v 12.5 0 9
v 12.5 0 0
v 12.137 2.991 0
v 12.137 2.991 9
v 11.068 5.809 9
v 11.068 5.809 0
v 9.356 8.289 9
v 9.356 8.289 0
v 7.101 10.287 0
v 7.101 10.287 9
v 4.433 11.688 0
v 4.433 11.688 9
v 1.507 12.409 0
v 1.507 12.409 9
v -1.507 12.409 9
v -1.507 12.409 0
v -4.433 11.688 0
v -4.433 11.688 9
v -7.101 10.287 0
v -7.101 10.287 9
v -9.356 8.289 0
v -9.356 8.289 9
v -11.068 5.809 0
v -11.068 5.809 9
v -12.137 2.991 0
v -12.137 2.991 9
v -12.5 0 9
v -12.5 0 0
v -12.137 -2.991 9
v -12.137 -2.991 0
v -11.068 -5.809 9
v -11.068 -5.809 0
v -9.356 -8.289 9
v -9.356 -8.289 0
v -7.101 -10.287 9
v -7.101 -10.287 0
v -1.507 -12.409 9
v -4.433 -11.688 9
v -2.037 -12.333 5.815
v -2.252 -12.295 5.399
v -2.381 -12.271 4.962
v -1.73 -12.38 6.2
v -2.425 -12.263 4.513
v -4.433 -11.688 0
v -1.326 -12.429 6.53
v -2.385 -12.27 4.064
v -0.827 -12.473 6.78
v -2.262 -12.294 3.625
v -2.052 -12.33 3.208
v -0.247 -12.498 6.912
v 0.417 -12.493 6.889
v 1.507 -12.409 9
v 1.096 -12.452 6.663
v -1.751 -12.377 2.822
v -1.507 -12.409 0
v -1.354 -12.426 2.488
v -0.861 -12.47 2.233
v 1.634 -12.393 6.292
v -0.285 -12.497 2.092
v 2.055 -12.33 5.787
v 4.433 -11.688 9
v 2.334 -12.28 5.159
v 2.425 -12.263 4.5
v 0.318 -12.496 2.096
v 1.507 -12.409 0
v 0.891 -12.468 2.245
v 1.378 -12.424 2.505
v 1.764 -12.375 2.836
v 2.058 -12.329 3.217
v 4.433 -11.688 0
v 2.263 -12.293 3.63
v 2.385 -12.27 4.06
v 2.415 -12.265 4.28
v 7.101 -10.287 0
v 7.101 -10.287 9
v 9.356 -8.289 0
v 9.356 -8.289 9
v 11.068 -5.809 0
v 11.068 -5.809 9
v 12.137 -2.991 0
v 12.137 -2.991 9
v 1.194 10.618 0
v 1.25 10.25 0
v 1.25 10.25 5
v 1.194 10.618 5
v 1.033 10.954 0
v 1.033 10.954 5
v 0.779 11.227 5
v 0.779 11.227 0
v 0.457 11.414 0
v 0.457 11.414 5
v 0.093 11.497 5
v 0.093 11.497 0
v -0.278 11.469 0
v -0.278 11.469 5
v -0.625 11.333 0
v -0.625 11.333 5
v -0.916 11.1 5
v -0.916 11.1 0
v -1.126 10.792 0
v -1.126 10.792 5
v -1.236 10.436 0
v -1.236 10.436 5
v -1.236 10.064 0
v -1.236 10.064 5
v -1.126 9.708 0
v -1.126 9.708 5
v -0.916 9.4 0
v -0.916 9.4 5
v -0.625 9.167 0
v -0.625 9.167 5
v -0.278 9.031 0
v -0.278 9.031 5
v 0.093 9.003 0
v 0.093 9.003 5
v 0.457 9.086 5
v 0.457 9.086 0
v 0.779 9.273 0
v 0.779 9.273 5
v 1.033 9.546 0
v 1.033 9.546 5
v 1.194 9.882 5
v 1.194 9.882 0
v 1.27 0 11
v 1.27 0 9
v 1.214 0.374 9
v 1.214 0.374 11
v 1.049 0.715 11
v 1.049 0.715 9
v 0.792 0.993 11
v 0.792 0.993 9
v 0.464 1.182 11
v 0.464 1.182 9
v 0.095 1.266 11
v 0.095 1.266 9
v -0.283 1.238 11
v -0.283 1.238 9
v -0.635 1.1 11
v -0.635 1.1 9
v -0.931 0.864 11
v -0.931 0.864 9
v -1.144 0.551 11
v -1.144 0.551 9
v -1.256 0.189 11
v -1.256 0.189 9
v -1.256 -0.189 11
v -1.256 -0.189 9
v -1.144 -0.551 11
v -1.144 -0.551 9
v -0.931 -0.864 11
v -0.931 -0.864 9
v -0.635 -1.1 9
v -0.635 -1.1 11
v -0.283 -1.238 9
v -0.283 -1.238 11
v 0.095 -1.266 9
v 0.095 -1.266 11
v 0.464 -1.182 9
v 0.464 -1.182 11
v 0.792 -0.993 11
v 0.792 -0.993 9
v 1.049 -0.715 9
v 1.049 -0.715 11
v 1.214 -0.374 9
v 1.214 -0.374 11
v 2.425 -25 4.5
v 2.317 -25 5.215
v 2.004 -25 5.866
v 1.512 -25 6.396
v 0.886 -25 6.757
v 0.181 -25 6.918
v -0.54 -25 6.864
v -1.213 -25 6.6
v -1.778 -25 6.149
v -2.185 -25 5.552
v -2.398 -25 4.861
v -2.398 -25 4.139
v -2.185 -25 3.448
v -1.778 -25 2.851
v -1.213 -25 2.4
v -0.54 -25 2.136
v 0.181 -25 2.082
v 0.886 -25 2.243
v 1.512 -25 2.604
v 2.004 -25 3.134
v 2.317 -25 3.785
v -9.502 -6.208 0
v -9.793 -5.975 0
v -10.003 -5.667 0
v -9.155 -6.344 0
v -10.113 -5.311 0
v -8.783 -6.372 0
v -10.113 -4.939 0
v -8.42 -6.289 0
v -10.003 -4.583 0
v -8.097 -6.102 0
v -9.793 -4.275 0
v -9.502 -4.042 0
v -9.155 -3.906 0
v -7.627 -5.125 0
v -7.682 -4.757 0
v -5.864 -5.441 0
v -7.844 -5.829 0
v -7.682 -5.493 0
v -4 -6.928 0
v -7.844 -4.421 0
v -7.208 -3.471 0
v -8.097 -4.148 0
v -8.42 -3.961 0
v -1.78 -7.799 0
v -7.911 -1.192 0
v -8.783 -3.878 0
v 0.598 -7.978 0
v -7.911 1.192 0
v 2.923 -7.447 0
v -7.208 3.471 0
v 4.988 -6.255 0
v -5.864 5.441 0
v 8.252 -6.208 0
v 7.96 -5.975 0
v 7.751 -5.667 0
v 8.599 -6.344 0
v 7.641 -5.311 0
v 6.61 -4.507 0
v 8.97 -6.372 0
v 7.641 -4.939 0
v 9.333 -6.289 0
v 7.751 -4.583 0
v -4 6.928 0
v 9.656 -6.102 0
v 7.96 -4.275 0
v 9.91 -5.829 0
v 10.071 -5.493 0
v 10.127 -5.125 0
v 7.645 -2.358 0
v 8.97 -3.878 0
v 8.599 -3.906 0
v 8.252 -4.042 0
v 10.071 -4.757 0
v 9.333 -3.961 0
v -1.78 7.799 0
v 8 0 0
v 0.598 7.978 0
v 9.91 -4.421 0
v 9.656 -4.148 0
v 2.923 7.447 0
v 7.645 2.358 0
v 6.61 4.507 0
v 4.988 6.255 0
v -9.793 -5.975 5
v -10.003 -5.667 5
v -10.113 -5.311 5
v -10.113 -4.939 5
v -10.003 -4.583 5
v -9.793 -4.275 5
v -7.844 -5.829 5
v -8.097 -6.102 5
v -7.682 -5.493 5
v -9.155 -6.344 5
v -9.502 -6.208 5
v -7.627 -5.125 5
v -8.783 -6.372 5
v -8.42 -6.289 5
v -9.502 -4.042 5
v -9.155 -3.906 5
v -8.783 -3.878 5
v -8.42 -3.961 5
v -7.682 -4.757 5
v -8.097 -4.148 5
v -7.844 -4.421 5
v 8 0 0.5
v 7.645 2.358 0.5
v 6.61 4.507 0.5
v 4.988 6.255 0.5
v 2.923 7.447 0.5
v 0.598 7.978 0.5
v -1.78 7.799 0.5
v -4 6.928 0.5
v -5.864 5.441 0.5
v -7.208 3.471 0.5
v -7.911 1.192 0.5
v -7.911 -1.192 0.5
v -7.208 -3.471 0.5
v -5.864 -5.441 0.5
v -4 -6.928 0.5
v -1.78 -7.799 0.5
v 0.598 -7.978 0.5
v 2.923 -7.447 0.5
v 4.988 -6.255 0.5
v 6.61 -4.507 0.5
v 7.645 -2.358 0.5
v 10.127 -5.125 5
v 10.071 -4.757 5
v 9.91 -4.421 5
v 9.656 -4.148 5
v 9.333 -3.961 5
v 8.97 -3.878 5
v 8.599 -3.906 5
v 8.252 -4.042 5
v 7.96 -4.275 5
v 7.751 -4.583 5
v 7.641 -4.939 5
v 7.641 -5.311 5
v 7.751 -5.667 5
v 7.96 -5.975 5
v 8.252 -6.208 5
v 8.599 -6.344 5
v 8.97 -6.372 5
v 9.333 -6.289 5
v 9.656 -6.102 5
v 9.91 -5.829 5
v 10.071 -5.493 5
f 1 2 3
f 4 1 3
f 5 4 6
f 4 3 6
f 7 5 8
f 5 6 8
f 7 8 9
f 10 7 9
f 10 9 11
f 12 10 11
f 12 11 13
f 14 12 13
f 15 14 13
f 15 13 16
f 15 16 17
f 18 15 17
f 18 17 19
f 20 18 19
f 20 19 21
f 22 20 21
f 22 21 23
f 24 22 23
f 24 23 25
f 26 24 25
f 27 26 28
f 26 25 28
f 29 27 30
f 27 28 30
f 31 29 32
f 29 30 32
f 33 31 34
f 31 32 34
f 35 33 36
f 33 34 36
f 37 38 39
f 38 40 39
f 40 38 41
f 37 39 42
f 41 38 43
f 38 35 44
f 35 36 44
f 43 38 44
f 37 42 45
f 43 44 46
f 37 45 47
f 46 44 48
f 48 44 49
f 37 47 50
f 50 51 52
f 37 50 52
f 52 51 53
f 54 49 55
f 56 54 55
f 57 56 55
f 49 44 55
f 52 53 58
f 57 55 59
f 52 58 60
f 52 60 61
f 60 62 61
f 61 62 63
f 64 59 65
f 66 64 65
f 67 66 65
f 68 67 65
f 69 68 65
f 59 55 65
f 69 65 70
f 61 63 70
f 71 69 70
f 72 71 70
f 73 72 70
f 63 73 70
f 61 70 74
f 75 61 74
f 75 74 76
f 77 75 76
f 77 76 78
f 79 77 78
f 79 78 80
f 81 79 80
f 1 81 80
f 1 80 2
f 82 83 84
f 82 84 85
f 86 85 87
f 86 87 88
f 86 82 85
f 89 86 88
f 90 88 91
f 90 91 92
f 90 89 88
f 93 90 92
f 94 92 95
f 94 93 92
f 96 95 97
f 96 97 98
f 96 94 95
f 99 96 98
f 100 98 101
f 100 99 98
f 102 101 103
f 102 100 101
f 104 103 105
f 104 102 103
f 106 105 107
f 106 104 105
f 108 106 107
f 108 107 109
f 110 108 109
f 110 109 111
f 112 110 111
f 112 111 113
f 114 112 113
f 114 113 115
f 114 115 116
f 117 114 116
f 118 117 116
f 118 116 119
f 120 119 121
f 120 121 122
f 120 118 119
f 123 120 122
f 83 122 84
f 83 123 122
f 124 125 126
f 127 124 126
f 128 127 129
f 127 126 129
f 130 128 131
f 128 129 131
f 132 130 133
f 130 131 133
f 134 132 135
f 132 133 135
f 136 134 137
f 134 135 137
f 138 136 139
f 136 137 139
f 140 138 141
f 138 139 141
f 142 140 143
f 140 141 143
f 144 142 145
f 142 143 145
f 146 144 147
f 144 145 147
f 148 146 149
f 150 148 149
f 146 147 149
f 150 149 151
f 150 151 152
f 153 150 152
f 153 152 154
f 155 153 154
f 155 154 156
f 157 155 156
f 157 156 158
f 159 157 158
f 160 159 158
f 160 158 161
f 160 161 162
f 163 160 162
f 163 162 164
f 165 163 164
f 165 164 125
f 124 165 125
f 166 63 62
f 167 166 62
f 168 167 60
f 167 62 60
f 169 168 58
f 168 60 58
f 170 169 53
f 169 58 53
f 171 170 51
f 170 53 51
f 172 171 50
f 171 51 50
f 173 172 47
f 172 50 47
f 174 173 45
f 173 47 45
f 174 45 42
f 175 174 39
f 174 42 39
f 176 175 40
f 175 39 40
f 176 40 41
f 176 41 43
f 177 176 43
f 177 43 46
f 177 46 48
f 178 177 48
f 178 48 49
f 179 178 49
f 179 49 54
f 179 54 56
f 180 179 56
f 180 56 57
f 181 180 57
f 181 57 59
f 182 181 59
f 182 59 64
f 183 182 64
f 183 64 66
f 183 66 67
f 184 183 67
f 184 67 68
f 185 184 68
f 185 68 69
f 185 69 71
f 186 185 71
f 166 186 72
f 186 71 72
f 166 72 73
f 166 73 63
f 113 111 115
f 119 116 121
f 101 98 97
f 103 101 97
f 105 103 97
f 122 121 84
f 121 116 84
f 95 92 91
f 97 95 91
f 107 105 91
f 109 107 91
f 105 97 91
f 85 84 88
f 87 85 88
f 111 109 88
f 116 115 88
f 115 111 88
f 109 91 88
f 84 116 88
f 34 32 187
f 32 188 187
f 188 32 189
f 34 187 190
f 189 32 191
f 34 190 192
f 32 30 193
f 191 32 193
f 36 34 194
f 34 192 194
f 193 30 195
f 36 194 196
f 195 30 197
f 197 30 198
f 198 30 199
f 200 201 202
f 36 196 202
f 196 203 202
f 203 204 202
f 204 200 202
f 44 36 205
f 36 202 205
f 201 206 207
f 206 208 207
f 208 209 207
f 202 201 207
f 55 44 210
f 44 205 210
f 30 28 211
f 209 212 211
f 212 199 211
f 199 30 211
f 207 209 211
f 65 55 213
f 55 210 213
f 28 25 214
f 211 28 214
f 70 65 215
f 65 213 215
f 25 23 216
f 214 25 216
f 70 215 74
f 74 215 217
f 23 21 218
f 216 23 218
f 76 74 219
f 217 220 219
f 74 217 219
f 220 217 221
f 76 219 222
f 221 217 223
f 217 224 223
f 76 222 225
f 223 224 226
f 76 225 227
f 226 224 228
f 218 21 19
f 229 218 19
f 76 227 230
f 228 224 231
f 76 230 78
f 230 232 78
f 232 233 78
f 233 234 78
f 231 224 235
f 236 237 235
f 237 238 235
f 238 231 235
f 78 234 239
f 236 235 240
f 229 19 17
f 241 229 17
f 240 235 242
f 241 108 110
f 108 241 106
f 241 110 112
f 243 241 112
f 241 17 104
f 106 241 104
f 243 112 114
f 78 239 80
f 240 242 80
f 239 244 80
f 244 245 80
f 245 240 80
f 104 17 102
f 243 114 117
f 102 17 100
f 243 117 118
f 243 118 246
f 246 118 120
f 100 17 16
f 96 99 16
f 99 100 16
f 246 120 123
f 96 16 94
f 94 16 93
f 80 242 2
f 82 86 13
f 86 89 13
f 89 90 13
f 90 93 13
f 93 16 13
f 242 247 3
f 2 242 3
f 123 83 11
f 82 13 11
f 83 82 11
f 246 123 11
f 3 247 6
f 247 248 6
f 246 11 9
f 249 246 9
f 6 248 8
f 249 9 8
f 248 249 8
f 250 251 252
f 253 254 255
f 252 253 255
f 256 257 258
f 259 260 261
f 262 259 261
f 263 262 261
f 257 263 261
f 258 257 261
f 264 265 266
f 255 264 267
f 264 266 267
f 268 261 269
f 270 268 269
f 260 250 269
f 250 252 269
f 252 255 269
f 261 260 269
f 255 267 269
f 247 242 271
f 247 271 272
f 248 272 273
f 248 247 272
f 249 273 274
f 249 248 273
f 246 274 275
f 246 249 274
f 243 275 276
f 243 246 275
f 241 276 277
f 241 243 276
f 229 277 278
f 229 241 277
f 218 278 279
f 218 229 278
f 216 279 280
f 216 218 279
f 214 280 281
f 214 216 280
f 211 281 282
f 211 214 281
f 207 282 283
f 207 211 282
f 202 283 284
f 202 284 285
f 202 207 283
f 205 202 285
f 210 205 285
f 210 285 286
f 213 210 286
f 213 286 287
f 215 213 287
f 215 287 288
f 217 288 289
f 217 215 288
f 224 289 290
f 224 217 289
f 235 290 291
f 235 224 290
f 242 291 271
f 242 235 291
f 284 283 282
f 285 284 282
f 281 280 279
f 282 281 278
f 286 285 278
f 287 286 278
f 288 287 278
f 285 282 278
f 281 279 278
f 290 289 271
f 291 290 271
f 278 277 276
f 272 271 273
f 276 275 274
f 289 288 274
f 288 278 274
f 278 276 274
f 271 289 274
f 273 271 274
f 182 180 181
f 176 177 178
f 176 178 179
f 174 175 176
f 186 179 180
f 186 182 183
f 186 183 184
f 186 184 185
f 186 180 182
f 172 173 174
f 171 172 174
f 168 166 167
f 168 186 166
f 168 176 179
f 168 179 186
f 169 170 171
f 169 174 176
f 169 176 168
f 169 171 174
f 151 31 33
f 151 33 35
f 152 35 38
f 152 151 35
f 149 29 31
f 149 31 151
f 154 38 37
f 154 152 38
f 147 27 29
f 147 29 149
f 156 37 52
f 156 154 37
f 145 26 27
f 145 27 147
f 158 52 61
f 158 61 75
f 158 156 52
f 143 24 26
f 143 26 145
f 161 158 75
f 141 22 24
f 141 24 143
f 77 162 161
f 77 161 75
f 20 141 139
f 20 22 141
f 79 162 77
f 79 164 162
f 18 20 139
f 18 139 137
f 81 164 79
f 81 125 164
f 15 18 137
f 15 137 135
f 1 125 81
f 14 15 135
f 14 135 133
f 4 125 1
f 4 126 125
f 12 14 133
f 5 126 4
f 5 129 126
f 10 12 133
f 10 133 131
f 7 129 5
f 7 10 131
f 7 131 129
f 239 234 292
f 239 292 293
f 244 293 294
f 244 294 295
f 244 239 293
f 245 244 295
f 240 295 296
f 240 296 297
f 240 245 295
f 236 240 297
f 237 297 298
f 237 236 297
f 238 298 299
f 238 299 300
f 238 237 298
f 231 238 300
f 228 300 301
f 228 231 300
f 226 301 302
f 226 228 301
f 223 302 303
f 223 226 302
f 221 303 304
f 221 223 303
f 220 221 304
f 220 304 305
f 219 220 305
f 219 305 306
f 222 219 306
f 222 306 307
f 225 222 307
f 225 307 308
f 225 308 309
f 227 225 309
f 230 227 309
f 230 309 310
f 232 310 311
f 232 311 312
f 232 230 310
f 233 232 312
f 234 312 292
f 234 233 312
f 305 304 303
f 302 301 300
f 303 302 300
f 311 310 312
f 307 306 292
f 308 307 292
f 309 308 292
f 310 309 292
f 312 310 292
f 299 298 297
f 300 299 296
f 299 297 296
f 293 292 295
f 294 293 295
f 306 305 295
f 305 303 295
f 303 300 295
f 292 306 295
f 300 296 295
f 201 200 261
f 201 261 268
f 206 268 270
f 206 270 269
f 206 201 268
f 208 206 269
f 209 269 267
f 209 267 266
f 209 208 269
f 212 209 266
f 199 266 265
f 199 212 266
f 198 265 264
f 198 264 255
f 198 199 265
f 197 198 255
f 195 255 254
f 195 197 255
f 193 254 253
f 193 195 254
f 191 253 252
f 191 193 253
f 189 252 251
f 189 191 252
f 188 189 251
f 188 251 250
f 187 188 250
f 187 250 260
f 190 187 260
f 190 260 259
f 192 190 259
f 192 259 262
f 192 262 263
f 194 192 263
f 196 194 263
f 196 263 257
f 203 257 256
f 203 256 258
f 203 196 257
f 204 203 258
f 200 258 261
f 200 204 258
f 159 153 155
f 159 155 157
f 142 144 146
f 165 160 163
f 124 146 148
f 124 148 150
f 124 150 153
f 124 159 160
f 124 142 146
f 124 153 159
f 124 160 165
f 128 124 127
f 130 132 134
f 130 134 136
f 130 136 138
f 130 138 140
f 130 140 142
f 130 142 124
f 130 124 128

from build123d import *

# Parameters (mm, degrees)
F0_R     = 12.5
F0_R_2   = 1.25
F0_R_3   = 8
F0_R_4   = 1.27
F1_DEPTH = 9
F2_DEPTH = 11
F3_DEPTH = 0.5
F4_DEPTH = 5
F5_R     = 2.425
F6_DEPTH = 25


with BuildPart() as f1:
    # F0 (on Top) → F1 (new body)
    with BuildSketch(Plane.XY):
        Circle(F0_R)
        with Locations((-8.87676, -5.125)):
            Circle(F0_R_2, mode=Mode.SUBTRACT)
        with Locations((8.87676, -5.125)):
            Circle(F0_R_2, mode=Mode.SUBTRACT)
        Circle(F0_R_3, mode=Mode.SUBTRACT)
        with Locations((0, 10.25)):
            Circle(F0_R_2, mode=Mode.SUBTRACT)
        Circle(F0_R_3)
        Circle(F0_R_4, mode=Mode.SUBTRACT)
        with Locations((-8.87676, -5.125)):
            Circle(F0_R_2)
        with Locations((8.87676, -5.125)):
            Circle(F0_R_2)
        Circle(F0_R_4)
        with Locations((0, 10.25)):
            Circle(F0_R_2)
    extrude(amount=F1_DEPTH)

    # F0 (on Top) → F2 (join)
    with BuildSketch(Plane.XY):
        Circle(F0_R_4)
    extrude(amount=F2_DEPTH)

    # F0 (on Top) → F3 (cut)
    with BuildSketch(Plane.XY):
        Circle(F0_R_3)
        Circle(F0_R_4, mode=Mode.SUBTRACT)
        Circle(F0_R_4)
    extrude(amount=F3_DEPTH, mode=Mode.SUBTRACT)

    # F0 (on Top) → F4 (cut)
    with BuildSketch(Plane.XY):
        with Locations((-8.87676, -5.125)):
            Circle(F0_R_2)
        with Locations((8.87676, -5.125)):
            Circle(F0_R_2)
        with Locations((0, 10.25)):
            Circle(F0_R_2)
    extrude(amount=F4_DEPTH, mode=Mode.SUBTRACT)

    # F5 (on Front) → F6 (join)
    with BuildSketch(Plane.XZ):
        with Locations((0, 4.5)):
            Circle(F5_R)
    extrude(amount=F6_DEPTH)


solid = f1.part
